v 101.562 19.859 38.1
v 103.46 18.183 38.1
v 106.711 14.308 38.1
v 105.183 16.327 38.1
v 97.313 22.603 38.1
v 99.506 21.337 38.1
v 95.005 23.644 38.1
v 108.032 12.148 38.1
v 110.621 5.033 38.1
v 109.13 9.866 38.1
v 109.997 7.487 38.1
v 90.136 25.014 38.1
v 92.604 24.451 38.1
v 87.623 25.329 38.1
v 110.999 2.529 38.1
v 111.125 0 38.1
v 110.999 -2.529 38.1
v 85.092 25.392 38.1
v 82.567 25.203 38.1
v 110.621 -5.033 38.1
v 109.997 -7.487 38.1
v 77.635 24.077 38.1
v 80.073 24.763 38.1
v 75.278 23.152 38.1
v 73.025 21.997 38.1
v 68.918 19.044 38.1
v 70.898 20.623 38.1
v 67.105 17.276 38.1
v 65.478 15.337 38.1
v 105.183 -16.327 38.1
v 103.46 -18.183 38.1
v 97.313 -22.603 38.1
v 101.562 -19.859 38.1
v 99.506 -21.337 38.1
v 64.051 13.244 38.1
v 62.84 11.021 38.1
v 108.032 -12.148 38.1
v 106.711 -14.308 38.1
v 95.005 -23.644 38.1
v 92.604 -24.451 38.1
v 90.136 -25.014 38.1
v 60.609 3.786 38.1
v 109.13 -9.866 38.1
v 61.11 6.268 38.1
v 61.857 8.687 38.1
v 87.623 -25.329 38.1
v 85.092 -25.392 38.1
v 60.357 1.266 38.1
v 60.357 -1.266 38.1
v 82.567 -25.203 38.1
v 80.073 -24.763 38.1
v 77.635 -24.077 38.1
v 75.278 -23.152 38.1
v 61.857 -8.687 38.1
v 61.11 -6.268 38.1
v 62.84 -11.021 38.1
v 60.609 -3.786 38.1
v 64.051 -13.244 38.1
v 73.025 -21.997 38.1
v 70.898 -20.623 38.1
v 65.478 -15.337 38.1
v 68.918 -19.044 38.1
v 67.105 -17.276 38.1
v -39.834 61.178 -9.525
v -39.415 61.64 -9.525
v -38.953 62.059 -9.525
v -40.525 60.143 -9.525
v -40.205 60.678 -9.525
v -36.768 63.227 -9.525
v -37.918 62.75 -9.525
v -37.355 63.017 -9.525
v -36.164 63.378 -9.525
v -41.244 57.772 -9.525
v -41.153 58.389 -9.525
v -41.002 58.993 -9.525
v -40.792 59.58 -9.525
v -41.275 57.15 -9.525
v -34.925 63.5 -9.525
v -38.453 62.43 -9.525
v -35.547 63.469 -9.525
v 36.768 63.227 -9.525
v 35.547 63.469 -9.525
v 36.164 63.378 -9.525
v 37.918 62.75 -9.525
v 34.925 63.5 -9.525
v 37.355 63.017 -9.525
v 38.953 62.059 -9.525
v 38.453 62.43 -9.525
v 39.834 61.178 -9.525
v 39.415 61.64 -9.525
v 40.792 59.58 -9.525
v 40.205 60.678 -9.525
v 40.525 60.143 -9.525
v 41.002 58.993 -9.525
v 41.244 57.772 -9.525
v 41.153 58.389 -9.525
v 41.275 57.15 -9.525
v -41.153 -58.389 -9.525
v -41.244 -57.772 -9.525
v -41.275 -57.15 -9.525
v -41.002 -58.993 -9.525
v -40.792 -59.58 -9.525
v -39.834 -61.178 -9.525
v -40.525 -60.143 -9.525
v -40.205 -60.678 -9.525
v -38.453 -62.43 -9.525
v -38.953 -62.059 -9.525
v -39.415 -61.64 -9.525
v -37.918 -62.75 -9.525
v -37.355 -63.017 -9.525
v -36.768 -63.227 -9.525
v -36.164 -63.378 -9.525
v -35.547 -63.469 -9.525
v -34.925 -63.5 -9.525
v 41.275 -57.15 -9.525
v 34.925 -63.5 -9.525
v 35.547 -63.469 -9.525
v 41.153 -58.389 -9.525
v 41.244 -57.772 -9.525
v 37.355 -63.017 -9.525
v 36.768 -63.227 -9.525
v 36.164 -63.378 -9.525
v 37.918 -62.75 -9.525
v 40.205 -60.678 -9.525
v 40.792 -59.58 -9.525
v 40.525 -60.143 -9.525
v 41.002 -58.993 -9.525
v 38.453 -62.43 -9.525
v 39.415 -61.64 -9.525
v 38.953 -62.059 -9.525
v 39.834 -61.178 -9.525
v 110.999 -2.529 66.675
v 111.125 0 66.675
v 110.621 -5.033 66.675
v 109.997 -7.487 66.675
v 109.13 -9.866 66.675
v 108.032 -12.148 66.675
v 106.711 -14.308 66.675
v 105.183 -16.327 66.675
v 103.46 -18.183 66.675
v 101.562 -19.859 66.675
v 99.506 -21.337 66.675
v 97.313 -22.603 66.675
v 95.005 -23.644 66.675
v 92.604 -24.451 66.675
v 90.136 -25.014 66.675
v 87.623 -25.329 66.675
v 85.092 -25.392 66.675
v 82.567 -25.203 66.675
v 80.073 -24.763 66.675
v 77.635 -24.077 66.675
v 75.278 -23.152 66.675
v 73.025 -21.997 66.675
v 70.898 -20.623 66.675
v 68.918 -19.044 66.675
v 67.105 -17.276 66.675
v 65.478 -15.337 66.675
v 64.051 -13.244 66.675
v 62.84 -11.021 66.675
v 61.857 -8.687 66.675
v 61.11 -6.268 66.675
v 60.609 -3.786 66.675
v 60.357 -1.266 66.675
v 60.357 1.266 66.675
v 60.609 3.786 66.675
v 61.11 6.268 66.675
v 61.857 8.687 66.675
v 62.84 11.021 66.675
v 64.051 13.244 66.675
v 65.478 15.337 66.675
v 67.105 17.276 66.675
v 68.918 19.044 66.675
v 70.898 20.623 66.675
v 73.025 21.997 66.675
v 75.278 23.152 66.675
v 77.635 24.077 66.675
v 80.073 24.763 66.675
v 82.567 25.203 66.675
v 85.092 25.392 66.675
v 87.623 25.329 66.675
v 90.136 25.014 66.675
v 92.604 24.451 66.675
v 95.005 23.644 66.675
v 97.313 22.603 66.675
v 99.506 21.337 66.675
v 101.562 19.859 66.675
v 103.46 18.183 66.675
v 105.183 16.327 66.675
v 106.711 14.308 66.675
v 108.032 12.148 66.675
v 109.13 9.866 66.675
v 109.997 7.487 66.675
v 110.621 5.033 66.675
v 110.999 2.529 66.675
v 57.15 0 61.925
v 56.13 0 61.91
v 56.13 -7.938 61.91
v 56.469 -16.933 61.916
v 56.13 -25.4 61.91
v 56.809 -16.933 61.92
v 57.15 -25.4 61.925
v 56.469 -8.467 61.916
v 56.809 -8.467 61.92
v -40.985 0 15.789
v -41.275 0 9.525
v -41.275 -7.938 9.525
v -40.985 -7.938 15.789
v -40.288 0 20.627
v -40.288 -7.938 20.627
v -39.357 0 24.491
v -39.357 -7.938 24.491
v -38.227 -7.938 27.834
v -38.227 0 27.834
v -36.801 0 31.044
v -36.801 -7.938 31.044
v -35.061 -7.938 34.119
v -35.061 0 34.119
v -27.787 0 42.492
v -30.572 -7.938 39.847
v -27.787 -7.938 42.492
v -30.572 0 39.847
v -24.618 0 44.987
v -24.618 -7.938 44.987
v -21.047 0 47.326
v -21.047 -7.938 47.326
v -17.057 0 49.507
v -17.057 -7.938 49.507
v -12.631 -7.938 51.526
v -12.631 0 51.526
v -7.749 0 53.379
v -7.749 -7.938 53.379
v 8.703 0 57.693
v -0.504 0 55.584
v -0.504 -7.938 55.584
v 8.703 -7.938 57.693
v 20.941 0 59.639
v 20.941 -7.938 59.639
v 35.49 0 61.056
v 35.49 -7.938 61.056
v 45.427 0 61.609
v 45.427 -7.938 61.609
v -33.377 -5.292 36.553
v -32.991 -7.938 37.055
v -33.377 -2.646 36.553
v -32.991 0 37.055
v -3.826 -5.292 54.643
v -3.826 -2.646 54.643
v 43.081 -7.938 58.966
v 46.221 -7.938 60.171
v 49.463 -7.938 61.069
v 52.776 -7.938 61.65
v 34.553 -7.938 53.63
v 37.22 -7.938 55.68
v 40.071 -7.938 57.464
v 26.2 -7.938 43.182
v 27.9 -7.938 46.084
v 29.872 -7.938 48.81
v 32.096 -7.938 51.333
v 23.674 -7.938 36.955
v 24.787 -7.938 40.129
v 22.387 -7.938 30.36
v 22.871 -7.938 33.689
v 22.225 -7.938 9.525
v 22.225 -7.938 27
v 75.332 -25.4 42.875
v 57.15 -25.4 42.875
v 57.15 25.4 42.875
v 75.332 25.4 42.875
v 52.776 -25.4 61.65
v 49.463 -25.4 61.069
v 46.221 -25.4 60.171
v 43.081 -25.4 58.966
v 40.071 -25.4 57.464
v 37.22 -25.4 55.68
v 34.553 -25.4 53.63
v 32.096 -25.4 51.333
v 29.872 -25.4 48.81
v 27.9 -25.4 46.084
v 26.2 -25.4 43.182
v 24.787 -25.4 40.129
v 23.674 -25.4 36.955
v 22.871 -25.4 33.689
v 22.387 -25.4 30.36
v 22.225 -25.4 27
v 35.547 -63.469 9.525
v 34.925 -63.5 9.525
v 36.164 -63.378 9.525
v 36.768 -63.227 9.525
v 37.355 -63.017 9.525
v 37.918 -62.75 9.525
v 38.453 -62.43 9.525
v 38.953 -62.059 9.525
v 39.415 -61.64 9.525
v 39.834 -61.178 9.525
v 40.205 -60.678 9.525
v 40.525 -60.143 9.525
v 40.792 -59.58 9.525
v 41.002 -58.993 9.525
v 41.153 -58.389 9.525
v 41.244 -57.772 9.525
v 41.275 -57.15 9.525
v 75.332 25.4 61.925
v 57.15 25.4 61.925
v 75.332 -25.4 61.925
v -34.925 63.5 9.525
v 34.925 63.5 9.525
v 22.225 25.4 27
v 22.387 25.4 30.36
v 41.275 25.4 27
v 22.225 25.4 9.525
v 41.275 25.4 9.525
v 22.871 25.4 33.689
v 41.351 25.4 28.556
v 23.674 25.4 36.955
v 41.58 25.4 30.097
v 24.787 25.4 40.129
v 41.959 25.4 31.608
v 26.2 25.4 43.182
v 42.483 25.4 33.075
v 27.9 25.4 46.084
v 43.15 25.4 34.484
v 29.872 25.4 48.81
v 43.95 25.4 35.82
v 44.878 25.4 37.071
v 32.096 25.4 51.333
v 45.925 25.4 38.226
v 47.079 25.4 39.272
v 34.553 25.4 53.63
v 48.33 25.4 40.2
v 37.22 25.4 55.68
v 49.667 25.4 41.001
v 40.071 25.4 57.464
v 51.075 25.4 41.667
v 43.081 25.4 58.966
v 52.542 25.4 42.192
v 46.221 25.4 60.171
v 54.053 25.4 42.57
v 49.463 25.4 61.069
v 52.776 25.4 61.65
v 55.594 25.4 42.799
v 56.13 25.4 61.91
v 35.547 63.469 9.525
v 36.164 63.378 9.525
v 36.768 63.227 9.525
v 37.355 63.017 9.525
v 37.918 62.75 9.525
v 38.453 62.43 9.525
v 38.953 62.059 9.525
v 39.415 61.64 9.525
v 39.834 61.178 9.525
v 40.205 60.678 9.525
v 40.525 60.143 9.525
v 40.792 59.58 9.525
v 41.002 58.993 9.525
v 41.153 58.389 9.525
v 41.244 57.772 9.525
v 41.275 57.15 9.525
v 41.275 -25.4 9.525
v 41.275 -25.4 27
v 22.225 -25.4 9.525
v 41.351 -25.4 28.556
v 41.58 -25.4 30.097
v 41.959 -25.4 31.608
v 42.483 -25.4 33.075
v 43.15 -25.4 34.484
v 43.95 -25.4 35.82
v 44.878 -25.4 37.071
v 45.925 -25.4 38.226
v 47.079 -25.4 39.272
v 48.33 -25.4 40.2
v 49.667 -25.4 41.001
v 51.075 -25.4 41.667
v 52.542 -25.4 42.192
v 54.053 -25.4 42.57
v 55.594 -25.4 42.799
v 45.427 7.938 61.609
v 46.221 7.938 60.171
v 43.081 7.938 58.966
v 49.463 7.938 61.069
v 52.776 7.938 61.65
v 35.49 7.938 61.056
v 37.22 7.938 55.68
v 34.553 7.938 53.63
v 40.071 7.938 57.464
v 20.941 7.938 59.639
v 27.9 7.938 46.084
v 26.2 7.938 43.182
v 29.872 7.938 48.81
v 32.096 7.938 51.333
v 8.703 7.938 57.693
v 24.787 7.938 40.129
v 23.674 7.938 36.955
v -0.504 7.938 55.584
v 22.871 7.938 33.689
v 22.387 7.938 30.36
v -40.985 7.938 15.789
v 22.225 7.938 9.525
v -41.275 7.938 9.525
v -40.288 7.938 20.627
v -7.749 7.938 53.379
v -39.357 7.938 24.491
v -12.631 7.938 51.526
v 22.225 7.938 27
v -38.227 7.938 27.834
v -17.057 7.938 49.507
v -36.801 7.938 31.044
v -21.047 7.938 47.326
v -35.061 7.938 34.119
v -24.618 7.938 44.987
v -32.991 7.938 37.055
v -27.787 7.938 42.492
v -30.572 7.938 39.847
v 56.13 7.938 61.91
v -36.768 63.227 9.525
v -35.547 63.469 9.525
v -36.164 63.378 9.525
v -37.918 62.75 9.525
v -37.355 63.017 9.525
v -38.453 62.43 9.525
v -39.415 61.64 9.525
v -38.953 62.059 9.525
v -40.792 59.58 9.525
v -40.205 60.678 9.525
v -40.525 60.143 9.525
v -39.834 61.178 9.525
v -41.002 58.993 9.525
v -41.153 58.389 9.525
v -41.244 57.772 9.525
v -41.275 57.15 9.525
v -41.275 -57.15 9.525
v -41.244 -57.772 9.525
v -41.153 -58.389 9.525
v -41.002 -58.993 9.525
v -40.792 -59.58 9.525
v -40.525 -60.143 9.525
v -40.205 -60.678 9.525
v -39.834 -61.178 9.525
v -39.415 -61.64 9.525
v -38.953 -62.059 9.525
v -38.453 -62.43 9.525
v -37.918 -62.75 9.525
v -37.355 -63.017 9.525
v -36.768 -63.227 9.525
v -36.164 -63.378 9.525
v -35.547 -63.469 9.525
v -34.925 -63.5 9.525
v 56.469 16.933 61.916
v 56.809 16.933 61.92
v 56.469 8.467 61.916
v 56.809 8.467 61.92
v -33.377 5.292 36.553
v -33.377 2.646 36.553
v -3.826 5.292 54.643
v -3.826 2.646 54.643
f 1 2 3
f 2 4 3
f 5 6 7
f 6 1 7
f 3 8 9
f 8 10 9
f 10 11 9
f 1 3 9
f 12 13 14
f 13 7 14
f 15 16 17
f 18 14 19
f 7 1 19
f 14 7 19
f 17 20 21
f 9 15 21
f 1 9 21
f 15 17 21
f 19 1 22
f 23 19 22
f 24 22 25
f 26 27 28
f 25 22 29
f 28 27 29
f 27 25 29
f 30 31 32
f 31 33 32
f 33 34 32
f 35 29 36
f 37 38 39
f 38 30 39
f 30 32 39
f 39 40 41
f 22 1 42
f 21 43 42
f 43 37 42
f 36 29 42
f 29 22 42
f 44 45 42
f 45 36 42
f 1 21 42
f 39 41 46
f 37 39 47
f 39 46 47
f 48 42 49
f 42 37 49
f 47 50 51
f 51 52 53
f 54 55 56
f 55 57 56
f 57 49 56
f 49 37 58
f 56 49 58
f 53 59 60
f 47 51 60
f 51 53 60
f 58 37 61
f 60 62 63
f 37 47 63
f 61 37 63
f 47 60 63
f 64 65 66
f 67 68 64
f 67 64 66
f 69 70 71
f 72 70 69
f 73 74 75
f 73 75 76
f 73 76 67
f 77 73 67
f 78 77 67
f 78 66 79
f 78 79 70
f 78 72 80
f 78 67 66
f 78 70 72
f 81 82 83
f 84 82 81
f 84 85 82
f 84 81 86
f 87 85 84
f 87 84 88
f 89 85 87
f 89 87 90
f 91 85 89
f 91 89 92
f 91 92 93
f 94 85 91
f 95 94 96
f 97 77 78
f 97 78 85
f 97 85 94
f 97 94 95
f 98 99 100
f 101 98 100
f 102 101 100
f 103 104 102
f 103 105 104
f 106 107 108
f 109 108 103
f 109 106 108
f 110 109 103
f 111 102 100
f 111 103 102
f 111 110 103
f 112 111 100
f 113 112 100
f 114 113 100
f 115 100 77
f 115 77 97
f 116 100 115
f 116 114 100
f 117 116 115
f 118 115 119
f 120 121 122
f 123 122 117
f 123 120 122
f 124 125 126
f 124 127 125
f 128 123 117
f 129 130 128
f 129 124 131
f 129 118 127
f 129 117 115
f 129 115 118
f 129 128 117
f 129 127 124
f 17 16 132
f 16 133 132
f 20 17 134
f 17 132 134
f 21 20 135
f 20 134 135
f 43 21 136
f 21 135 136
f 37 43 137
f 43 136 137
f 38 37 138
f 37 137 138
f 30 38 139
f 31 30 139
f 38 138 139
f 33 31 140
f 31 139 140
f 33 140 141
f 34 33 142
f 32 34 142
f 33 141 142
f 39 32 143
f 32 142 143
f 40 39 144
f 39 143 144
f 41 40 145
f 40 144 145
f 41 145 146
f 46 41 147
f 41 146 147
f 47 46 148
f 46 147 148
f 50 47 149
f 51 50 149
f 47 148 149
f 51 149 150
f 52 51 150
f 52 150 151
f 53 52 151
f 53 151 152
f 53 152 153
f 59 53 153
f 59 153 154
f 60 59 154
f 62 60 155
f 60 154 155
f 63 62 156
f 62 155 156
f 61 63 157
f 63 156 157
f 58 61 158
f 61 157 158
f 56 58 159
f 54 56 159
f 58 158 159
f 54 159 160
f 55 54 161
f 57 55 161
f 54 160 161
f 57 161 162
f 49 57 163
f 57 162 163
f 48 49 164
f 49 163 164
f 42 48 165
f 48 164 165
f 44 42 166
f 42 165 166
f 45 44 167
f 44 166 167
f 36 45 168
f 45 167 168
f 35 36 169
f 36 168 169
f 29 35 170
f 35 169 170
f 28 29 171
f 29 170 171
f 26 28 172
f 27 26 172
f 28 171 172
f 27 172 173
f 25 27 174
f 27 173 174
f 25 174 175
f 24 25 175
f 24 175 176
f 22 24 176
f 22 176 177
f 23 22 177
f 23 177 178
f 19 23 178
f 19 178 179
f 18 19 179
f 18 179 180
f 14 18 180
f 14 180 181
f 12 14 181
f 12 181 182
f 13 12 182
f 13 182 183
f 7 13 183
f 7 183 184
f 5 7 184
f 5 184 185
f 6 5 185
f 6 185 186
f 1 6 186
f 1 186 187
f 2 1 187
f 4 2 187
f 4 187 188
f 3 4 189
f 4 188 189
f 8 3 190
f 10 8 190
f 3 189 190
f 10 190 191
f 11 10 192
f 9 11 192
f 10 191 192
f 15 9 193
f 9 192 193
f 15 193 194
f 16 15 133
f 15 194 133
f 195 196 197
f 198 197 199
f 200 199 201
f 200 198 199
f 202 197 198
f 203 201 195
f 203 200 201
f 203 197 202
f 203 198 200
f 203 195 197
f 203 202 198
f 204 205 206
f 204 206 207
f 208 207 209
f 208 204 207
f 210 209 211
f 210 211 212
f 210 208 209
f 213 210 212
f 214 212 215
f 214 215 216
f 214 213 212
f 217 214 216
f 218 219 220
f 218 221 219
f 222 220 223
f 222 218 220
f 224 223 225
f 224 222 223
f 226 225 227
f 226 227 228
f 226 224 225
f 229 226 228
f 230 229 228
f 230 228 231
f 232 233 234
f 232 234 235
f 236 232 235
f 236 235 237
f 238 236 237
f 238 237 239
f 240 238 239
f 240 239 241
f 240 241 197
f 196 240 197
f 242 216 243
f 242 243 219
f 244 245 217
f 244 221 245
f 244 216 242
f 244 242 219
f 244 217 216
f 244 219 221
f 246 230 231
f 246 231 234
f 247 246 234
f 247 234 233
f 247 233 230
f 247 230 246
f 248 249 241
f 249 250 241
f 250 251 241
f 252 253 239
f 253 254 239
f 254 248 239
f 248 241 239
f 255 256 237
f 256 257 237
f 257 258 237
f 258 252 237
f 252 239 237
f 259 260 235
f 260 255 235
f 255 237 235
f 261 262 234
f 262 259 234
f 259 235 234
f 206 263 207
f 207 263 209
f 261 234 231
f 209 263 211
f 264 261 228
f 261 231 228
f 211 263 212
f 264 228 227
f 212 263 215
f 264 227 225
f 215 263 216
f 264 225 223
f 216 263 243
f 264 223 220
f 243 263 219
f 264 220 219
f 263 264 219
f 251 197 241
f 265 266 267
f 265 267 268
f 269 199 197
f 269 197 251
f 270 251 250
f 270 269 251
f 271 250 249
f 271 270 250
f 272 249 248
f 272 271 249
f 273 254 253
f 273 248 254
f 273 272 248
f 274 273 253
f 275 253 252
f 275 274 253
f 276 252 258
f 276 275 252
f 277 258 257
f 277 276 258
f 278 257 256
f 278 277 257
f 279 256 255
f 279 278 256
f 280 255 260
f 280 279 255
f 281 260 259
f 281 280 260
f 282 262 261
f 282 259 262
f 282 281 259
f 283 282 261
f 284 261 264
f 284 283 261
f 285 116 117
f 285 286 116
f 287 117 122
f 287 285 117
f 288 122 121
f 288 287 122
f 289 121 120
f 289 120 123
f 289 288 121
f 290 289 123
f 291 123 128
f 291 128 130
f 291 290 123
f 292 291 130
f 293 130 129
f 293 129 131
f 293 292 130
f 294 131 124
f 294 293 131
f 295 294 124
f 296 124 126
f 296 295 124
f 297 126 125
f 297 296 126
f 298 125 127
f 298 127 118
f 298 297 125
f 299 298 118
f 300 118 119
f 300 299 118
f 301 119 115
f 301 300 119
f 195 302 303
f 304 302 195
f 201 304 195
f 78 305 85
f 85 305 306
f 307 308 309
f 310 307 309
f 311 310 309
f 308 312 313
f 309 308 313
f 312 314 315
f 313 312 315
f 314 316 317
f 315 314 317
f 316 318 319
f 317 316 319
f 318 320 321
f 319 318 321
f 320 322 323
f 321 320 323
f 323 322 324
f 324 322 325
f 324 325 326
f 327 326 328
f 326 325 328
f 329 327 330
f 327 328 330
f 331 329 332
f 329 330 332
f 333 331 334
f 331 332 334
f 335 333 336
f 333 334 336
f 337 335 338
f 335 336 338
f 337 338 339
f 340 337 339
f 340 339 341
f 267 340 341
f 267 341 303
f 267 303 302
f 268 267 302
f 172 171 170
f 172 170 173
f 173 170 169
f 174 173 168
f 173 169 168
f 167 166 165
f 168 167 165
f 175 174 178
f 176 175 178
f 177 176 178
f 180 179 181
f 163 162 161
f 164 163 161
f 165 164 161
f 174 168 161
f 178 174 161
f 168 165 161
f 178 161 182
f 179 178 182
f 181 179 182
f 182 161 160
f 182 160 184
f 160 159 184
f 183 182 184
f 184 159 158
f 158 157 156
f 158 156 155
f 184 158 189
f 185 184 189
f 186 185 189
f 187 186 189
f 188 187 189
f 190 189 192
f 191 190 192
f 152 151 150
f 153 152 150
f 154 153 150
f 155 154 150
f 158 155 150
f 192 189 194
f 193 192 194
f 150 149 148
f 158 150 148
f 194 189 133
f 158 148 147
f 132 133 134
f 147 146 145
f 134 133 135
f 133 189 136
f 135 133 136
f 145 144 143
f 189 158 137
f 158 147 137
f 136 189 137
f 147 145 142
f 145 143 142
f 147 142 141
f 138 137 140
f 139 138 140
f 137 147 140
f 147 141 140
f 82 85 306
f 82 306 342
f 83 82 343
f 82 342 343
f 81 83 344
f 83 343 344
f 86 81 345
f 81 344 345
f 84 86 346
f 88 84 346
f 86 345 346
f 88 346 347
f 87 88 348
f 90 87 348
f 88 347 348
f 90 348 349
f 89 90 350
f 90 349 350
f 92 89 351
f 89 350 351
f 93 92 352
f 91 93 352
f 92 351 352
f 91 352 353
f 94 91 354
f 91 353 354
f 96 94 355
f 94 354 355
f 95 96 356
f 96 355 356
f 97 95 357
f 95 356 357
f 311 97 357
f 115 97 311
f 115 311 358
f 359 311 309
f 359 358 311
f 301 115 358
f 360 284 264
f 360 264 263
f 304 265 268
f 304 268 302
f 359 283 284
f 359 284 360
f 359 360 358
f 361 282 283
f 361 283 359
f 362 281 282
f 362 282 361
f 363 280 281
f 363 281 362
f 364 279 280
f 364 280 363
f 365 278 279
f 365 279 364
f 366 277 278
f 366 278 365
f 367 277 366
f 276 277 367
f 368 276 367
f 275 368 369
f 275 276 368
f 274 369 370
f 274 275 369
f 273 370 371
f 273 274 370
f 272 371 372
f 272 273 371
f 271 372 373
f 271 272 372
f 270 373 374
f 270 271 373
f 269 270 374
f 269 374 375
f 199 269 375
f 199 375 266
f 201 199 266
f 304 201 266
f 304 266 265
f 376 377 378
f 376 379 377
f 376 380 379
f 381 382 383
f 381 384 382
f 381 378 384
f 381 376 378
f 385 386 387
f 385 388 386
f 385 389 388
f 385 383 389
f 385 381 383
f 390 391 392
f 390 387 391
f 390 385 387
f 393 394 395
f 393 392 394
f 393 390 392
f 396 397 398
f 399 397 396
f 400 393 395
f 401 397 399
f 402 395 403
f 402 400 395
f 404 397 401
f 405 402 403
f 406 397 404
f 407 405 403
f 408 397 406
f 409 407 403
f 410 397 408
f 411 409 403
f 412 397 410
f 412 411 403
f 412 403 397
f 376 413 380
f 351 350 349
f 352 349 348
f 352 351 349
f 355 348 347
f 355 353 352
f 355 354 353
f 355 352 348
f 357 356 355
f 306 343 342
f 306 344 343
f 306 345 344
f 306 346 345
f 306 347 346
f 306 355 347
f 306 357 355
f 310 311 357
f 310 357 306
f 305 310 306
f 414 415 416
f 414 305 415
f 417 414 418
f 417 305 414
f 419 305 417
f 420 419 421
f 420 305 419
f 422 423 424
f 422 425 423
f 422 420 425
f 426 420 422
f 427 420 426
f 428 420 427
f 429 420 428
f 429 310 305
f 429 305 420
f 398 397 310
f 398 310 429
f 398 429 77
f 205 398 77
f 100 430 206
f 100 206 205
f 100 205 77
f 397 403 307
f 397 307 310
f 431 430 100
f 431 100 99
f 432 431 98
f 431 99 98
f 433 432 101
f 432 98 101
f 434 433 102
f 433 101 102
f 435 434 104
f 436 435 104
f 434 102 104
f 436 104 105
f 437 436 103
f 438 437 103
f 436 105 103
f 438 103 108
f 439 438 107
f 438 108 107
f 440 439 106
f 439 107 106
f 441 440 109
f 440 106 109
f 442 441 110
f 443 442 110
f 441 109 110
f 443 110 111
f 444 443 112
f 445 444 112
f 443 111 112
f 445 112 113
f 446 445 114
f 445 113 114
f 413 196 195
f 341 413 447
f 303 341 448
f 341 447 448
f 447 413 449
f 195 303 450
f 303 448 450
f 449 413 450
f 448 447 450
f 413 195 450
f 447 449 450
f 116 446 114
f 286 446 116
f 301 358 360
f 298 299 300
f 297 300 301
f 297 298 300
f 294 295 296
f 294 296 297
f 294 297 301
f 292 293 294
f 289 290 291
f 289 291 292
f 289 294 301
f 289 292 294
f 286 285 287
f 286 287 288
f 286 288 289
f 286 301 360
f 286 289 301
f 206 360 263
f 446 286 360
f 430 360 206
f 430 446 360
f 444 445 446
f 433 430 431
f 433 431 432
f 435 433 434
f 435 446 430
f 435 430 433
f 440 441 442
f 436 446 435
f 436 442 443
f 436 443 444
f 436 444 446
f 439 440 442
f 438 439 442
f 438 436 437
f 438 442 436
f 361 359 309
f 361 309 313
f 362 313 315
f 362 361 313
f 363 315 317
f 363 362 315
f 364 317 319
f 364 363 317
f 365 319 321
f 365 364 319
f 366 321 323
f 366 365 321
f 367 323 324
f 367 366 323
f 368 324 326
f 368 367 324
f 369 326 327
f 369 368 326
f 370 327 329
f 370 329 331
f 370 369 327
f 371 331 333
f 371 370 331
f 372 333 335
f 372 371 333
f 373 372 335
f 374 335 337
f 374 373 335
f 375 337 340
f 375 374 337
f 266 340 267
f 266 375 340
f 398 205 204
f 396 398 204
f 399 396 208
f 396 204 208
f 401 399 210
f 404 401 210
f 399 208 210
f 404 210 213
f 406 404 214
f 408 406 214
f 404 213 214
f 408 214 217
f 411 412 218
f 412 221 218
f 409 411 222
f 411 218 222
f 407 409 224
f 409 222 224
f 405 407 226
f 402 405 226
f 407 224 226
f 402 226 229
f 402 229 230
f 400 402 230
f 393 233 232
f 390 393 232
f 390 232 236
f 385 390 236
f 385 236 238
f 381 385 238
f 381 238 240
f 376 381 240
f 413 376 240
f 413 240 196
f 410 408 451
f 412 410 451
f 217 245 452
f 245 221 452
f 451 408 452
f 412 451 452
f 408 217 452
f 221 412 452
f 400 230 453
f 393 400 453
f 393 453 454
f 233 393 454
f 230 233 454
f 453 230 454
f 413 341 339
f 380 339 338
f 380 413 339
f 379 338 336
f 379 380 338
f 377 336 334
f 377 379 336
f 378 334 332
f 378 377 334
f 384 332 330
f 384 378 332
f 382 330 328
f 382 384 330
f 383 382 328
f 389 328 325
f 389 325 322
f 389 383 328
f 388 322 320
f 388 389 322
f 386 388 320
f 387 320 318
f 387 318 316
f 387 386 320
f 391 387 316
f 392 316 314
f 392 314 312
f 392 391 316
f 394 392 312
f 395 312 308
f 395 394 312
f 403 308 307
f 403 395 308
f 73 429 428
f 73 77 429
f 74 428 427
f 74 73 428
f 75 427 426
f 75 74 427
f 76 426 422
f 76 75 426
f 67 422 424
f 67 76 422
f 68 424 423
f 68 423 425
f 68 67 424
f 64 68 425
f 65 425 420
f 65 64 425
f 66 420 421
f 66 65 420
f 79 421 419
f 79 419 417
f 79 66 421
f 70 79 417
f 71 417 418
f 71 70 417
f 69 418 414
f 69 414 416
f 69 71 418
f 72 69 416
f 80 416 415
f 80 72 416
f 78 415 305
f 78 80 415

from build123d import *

# Parameters (mm, degrees)
F1_DEPTH = 63.5
F0_W     = 15.006551
F0_H     = 19.05
F2_DEPTH = 25.4
F3_DEPTH = 7.9375
F4_R     = 6.35


with BuildPart() as f1:
    # F0 (on Front) → F1 (new body, symmetric)
    with BuildSketch(Plane.XZ):
        Polygon((22.225, 9.525), (-41.275, 9.525), (-41.275, -9.525), (41.275, -9.525), (41.275, 9.525), align=None)
    extrude(amount=F1_DEPTH, both=True)

    # F0 (on Front) → F2 (join, symmetric)
    with BuildSketch(Plane.XZ):
        with BuildLine():
            Line((22.225, 27.0002), (22.225, 9.525))
            Line((22.225, 9.525), (41.275, 9.525))
            Line((41.275, 9.525), (41.275, 27.0002))
            ThreePointArc((41.275, 27.0002), (45.92468, 38.22552), (57.15, 42.8752))
            Line((57.15, 42.8752), (60.325, 42.8752))
            Line((60.325, 42.8752), (60.325, 61.9252))
            Line((60.325, 61.9252), (57.15, 61.9252))
            add(Edge.make_bspline(
                [(56.129784, 61.910296), (56.468748, 61.915623), (56.808819, 61.920592), (57.15, 61.9252)],
                knots=[111.022538, 111.022538, 111.022538, 111.022538, 111.504536, 111.504536, 111.504536, 111.504536], degree=3))
            ThreePointArc((56.129784, 61.910296), (32.096191, 51.33253), (22.225, 27.0002))
        make_face()
        with Locations((67.828275, 52.4002)):
            Rectangle(F0_W, F0_H)
    extrude(amount=F2_DEPTH, both=True)

    # F0 (on Front) → F3 (join, symmetric)
    with BuildSketch(Plane.XZ):
        with BuildLine():
            add(Edge.make_bspline(
                [(-41.275, 9.525), (-41.285966, 40.392941), (-21.946413, 60.683143), (56.129784, 61.910296)],
                knots=[0, 0, 0, 0, 111.022538, 111.022538, 111.022538, 111.022538], degree=3))
            Line((-41.275, 9.525), (22.225, 9.525))
            Line((22.225, 9.525), (22.225, 27.0002))
            ThreePointArc((22.225, 27.0002), (32.096191, 51.33253), (56.129784, 61.910296))
        make_face()
    extrude(amount=F3_DEPTH, both=True)

    # F4
    f4_edges = [f1.edges().sort_by_distance(p)[0] for p in [
        (41.275, -63.5, 0),
        (-41.275, -63.5, 0),
        (41.275, 63.5, 0),
        (-41.275, 63.5, 0),
    ]]
    fillet(f4_edges, radius=F4_R)


with BuildPart() as f5:
    # F0 (on Front) → F5 (revolve)
    with BuildSketch(Plane.XZ):
        Polygon((111.125, 66.675), (85.725, 66.675), (85.725, 52.3875), (85.725, 38.1), (111.125, 38.1), align=None)
    revolve(axis=Axis((85.725, 0, 52.3875), (0, 0, -1)))


solid = Compound([f1.part, f5.part])
